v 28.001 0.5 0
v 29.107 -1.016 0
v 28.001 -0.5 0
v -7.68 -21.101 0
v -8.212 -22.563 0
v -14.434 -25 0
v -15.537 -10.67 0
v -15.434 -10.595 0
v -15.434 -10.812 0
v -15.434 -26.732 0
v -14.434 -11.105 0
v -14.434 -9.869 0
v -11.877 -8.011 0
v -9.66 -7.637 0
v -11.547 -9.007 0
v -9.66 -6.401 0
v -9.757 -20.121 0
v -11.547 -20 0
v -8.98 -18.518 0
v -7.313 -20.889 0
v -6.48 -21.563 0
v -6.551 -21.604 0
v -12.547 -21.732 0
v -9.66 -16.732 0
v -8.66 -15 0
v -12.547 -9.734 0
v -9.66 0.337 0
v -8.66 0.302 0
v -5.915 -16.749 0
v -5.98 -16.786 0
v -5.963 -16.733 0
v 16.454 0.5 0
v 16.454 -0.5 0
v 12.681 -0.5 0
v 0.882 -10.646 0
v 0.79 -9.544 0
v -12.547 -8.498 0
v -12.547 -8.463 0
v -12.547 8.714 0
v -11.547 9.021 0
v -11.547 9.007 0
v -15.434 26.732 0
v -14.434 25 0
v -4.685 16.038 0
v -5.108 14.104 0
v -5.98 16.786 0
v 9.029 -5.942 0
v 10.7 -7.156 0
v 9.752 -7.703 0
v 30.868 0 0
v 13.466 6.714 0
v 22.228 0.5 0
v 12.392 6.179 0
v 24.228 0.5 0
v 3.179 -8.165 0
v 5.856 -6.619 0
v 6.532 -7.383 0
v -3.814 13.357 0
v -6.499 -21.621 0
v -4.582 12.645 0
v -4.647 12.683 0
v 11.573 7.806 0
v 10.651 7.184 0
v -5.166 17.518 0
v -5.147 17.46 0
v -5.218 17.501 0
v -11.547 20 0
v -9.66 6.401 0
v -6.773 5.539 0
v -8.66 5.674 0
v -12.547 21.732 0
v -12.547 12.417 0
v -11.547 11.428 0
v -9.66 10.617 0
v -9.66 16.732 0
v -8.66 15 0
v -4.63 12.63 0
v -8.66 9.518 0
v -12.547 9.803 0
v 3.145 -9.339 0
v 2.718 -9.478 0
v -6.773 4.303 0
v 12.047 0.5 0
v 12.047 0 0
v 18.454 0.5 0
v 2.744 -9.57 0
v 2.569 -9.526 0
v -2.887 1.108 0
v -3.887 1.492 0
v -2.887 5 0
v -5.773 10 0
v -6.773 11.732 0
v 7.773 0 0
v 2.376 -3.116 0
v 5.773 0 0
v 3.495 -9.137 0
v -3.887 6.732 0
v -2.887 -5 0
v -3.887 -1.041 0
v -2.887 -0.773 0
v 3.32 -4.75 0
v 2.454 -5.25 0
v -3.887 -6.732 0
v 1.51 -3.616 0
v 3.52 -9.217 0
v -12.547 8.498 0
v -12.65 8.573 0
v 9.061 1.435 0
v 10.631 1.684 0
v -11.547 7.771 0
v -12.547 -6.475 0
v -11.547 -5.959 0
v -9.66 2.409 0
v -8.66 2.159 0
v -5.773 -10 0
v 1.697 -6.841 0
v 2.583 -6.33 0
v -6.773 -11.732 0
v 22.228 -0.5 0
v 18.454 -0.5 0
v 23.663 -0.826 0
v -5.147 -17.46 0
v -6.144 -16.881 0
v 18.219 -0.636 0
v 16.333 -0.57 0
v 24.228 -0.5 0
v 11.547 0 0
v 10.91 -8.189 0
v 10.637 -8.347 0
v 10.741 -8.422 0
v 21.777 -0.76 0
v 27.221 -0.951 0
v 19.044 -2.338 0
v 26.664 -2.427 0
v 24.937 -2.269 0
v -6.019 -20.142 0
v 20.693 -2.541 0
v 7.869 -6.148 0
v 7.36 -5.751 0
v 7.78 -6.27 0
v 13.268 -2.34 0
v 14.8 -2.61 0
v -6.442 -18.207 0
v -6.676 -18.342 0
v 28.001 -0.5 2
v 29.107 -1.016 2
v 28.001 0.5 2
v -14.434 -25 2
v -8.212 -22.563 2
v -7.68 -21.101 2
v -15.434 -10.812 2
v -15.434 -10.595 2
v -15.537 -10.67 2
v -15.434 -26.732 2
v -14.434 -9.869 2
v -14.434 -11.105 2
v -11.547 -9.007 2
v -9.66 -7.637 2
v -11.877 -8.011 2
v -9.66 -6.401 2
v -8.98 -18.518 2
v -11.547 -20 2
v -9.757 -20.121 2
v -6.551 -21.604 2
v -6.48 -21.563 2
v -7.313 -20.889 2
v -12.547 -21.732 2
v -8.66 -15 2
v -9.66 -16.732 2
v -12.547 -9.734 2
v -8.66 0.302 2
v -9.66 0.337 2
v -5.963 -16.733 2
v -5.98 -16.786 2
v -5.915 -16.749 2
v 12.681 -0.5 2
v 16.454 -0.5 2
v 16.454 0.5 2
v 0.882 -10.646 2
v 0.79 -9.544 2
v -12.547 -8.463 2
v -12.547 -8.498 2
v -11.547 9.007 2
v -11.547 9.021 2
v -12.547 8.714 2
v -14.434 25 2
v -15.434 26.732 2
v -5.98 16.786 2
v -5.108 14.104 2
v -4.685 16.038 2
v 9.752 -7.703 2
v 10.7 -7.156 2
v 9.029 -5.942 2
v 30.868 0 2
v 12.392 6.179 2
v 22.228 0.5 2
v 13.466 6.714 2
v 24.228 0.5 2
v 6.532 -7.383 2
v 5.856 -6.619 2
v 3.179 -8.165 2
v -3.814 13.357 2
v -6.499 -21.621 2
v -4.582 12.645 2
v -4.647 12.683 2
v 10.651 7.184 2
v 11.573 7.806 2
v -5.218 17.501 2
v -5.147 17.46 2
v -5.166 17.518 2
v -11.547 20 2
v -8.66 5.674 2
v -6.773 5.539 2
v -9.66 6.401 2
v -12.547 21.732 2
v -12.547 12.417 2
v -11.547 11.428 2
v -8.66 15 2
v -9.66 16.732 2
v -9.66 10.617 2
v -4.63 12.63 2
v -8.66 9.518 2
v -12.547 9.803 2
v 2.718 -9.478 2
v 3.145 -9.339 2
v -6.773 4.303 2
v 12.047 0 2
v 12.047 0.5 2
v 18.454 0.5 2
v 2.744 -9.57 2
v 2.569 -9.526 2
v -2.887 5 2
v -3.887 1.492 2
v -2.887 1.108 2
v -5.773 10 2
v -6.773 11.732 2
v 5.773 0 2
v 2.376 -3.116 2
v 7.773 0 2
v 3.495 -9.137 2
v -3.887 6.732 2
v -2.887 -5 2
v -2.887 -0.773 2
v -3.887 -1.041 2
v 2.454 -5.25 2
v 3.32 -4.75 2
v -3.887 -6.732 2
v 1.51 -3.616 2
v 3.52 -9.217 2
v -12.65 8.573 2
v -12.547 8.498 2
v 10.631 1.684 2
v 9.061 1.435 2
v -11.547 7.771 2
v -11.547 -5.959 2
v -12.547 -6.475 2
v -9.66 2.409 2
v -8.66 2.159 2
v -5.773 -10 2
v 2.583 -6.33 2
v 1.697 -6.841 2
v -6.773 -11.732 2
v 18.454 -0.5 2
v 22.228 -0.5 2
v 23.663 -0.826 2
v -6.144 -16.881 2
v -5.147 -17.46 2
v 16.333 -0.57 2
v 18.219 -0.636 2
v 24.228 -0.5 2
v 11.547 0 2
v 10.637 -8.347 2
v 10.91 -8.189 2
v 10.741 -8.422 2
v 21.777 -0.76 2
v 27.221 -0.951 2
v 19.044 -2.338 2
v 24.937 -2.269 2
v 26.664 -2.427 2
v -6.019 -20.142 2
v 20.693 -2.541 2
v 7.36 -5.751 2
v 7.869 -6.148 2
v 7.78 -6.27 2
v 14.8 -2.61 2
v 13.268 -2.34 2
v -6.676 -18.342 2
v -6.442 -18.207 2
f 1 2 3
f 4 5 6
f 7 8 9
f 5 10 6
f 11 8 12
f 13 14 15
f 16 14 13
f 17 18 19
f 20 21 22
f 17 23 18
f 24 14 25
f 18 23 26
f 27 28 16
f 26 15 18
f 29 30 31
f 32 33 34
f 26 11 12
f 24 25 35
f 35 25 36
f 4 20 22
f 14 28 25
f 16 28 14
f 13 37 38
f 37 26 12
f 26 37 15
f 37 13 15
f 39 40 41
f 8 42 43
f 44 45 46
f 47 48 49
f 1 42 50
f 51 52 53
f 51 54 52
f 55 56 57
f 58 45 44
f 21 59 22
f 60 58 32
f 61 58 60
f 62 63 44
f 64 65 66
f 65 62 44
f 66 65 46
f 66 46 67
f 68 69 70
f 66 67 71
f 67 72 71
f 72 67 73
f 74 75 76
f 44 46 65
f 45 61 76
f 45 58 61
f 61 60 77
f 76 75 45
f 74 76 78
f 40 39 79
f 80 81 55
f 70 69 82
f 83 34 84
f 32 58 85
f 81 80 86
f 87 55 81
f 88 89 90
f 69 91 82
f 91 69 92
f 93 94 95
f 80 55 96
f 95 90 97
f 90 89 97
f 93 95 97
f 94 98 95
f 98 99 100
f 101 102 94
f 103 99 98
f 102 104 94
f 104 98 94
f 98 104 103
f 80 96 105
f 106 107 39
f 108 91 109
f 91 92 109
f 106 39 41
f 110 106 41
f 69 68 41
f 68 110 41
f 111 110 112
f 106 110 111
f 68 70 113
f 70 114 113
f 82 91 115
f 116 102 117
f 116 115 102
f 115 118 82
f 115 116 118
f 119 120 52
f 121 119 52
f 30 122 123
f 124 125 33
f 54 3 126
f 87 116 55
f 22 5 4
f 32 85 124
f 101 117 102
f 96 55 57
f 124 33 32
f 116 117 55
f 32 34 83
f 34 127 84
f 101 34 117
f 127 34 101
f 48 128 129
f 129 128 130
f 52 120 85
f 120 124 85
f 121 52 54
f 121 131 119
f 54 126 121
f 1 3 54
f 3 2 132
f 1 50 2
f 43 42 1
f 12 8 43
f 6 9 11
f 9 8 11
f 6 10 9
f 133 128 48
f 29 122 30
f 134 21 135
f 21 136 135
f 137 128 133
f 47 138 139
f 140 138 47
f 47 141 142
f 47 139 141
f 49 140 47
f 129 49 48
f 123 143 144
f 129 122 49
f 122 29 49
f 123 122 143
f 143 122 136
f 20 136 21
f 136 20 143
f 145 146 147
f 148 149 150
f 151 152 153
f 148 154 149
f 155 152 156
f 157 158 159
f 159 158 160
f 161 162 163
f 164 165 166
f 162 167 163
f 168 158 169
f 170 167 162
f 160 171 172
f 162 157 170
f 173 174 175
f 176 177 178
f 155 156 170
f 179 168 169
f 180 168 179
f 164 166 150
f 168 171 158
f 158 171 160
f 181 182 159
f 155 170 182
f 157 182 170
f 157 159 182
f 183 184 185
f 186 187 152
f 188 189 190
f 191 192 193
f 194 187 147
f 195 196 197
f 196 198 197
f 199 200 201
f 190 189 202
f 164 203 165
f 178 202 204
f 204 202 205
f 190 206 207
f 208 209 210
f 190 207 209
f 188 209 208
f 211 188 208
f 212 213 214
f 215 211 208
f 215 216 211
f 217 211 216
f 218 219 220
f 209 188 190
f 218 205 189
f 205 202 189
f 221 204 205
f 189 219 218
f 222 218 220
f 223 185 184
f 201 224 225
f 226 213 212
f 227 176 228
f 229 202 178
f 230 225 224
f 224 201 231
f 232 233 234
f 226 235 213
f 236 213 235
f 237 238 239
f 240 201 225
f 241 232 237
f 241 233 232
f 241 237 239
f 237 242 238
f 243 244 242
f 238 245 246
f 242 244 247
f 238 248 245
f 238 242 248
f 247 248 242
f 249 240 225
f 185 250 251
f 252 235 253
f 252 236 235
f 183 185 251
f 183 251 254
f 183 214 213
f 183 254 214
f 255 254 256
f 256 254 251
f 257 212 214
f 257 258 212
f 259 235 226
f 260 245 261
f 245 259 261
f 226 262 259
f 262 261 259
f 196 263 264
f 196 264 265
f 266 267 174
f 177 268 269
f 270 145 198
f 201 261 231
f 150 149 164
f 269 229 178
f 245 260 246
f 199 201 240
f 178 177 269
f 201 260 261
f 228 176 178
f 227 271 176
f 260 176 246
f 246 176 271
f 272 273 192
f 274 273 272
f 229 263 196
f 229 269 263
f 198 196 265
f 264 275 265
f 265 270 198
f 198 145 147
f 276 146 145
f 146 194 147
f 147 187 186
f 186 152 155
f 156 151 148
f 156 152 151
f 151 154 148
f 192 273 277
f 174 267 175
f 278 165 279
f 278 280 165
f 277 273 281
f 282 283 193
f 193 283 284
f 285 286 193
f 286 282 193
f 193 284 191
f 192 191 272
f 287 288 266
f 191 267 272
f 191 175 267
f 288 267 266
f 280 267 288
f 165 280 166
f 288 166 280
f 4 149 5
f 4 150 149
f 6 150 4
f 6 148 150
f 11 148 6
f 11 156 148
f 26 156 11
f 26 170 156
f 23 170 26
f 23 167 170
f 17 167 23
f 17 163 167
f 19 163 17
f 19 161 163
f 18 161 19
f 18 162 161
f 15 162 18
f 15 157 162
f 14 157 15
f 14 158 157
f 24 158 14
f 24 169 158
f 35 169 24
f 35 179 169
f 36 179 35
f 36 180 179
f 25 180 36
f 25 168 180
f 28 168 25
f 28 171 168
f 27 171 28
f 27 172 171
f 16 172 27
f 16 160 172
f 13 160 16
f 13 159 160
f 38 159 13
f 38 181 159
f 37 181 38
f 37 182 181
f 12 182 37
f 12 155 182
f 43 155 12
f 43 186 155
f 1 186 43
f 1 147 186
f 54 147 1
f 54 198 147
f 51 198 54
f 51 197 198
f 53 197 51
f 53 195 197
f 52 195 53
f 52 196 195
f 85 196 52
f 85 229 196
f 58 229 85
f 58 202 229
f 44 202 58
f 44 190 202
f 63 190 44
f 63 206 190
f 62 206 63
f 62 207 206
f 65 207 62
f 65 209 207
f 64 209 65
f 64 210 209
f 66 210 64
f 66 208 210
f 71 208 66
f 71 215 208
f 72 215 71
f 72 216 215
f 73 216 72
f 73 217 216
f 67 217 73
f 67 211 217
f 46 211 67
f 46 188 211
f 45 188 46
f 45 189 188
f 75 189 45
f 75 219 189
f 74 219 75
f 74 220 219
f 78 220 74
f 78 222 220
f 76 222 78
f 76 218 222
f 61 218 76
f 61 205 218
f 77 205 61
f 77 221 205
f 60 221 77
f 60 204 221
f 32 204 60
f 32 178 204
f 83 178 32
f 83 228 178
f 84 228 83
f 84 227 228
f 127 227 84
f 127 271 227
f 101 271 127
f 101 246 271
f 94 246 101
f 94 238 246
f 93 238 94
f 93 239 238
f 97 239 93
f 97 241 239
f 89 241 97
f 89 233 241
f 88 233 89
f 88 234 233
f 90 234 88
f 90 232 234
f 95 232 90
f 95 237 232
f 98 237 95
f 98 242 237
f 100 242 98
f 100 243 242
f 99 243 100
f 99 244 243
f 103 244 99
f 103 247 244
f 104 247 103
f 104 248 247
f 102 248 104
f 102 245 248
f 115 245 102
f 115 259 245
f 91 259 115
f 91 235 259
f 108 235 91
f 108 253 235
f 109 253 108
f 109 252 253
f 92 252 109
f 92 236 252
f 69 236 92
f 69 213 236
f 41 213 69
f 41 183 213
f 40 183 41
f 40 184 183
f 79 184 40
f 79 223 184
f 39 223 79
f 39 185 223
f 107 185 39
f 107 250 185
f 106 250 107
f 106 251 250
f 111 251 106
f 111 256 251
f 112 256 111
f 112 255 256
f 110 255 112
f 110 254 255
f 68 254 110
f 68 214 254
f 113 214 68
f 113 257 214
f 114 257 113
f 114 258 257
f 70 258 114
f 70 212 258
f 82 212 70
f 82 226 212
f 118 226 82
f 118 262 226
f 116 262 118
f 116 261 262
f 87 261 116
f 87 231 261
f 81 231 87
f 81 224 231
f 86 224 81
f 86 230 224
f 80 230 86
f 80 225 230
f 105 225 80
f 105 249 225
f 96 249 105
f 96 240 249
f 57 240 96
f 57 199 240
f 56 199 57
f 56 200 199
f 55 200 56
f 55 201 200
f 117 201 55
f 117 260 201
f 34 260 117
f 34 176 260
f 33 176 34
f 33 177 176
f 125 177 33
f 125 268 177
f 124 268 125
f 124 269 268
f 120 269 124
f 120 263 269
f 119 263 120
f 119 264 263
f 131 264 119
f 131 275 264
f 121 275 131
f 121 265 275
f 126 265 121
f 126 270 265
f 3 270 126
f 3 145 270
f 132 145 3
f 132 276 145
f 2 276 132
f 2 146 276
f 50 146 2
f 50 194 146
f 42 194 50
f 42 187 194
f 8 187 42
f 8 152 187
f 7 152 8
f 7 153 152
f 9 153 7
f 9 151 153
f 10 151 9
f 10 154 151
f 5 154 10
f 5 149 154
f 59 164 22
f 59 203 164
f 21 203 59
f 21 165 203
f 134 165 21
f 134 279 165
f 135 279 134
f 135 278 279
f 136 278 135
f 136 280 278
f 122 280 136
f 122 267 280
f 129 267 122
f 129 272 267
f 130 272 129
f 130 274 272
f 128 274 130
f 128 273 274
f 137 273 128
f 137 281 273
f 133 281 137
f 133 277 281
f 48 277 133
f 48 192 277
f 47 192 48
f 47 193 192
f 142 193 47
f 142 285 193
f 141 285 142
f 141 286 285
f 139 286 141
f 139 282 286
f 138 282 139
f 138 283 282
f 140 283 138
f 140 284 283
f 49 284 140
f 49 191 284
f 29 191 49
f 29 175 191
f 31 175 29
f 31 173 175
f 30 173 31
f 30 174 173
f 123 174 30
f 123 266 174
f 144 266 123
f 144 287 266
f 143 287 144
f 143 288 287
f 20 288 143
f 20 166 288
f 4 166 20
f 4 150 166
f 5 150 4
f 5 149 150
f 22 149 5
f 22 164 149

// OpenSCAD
side_length = 50; 

wall_thickness = 1;
wall_height = 2;

cblocks = 10;  
levels = 5; 

/*
 * constants, for clearness
 *
 */
 
// random directions, for picking up a direction to visit the next block
function PERMUTATION_OF_FOUR() = [
    [1, 2, 3, 4],
    [1, 2, 4, 3],
    [1, 3, 2, 4],
    [1, 3, 4, 2],
    [1, 4, 2, 3],
    [1, 4, 3, 2],
    [2, 1, 3, 4],
    [2, 1, 4, 3],
    [2, 3, 1, 4],
    [2, 3, 4, 1],
    [2, 4, 1, 3],
    [2, 4, 3, 1],
    [3, 1, 2, 4],
    [3, 1, 4, 2],
    [3, 2, 1, 4],
    [3, 2, 4, 1],
    [3, 4, 1, 2],
    [3, 4, 2, 1],
    [4, 1, 2, 3],
    [4, 1, 3, 2],
    [4, 2, 1, 3],
    [4, 2, 3, 1],
    [4, 3, 1, 2],
    [4, 3, 2, 1]
];

function NO_WALL() = 0;
function UP_WALL() = 1;
function RIGHT_WALL() = 2;
function UP_RIGHT_WALL() = 3;

function NOT_VISITED() = 0;
function VISITED() = 1;

/* 
 * modules for creating a maze
 *
 */

function PI() = 3.14159;



/* 
 * utilities functions
 *
 */

// comare the equality of [x1, y1] and [x2, y2]
function cord_equals(cord1, cord2) = cord1 == cord2;

// is the point visited?
function not_visited(cord, vs, index = 0) =
    index == len(vs) ? true : 
        (cord_equals([vs[index][0], vs[index][1]], cord) && vs[index][2] == 1 ? false :
            not_visited(cord, vs, index + 1));
            
// pick a direction randomly
function rand_dirs() =
    PERMUTATION_OF_FOUR()[round(rands(0, 24, 1)[0])]; 

// replace v1 in the vector with v2 
function replace(v1, v2, vs) =
    [for(i = [0:len(vs) - 1]) vs[i] == v1 ? v2 : vs[i]];
    
/* 
 * functions for generating a maze vector
 *
 */

// initialize a maze
function init_maze(rows, columns) = 
    [
	    for(c = [1 : columns]) 
	        for(r = [1 : rows]) 
		        [c, r, 0,  UP_RIGHT_WALL()]
	];
    
// find a vector in the maze vector
function find(i, j, maze_vector, index = 0) =
    index == len(maze_vector) ? [] : (
        cord_equals([i, j], [maze_vector[index][0], maze_vector[index][1]]) ? maze_vector[index] : find(i, j, maze_vector, index + 1)
    );

////
// NO_WALL = 0;
// UP_WALL = 1;
// RIGHT_WALL = 2;
// UP_RIGHT_WALL = 3;
function delete_right_wall(original_block) = 
    original_block == NO_WALL() || original_block == RIGHT_WALL() ? NO_WALL() : UP_WALL();

function delete_up_wall(original_block) = 
    (original_block == NO_WALL() || original_block == UP_WALL()) ? NO_WALL() : RIGHT_WALL();
    
function delete_right_wall_of(vs, is_visited, maze_vector) =
    replace(vs, [vs[0], vs[1] , is_visited, delete_right_wall(vs[3])] ,maze_vector);

function delete_up_wall_of(vs, is_visited, maze_vector) =
    replace(vs, [vs[0], vs[1] , is_visited, delete_up_wall(vs[3])] ,maze_vector);

function go_right(i, j, rows, columns, maze_vector) =
    go_maze(i + 1, j, rows, columns, delete_right_wall_of(find(i, j, maze_vector), VISITED(), maze_vector));
    
function go_up(i, j, rows, columns, maze_vector) =
    go_maze(i, j - 1, rows, columns, delete_up_wall_of(find(i, j, maze_vector), VISITED(), maze_vector));
    
function visit(v, maze_vector) =
    replace(v, [v[0], v[1], VISITED(), v[3]], maze_vector);
 
function go_left(i, j, rows, columns, maze_vector) =
    go_maze(i - 1, j, rows, columns, delete_right_wall_of(find(i - 1, j, maze_vector), NOT_VISITED(), maze_vector));
    
function go_down(i, j, rows, columns, maze_vector) =
    go_maze(i, j + 1, rows, columns, delete_up_wall_of(find(i, j + 1, maze_vector), NOT_VISITED(), maze_vector));
    
function go_maze(i, j, rows, columns, maze_vector) =
    look_around(i, j, rand_dirs(), rows, columns, visit(find(i, j, maze_vector), maze_vector));
    
function look_around(i, j, dirs, rows, columns, maze_vector, index = 0) =
    index == 4 ? maze_vector : 
        look_around( 
            i, j, dirs, 
            rows, columns, 
            build_wall(i, j, dirs[index], rows, columns, maze_vector), 
            index + 1
        ); 

function build_wall(i, j, n, rows, columns, maze_vector) = 
    n == 1 && i != columns && not_visited([i + 1, j], maze_vector) ? go_right(i, j, rows, columns, maze_vector) : ( 
        n == 2 && j != 1 && not_visited([i, j - 1], maze_vector) ? go_up(i, j, rows, columns, maze_vector)  : (
            n == 3 && i != 1 && not_visited([i - 1, j], maze_vector) ? go_left(i, j,rows, columns,  maze_vector)  : (
                n == 4 && j != rows && not_visited([i, j + 1], maze_vector) ? go_down(i, j, rows, columns, maze_vector) : maze_vector
            ) 
        )
    ); 

// give a [x, y] point and length. draw a line in the x direction
module x_line(point, length, thickness = 1) {
    offset = thickness / 2;
    translate([point[0] - offset, point[1] - offset, 0]) 
        square([length + thickness, thickness]);
}

// create a equilateral triangle
module equilateral_triangle(side_length, center = false) {
    radius = 0.57735026918962576450914878050196 * side_length;
	circle(r = radius, center = center, $fn = 3); 
}

// create a holly equilateral triangle
module holly_equilateral_triangle(side_length, thickness = 1, center = true) {
    difference() {
	    offset(delta = thickness) equilateral_triangle(side_length, center = center);
	    equilateral_triangle(side_length, center = center);
    }
}

// Given a side length of a equilateral triangle, return the length of incenter to vertex.
function triangle_incenter_to_vertex_length(triangle_side_length) = 0.57735026918962576450914878050196 * triangle_side_length;

// used by `sector_cutter` module. Accepted angle is from 0 to 90 degree.
module a_quarter_sector_cutter(radius, angle) {
    outer = radius;
    polygon([[0, 0], [outer, 0], [outer, outer * sin(angle)], [outer * cos(angle), outer * sin(angle)]]);
}

// userd by `holly_equilateral_triangle_sector` for difference
module sector_cutter(radius, angles) {
    angle_from = angles[0];
    angle_to = angles[1];
    angle_difference = angle_to - angle_from;
    
    rotate(angle_from)
        if(angle_difference <= 90) {
            a_quarter_sector_cutter(radius, angle_difference);
        } else if(angle_difference > 90 && angle_difference <= 180) {
            sector_cutter(radius, [0, 90]);
            rotate(90) a_quarter_sector_cutter(radius, angle_difference - 90);
        } else if(angle_difference > 180 && angle_difference <= 270) {
            sector_cutter(radius, [0, 180]);
            rotate(180) a_quarter_sector_cutter(radius, angle_difference - 180);
        } else if(angle_difference > 270 && angle_difference <= 360) {
            sector_cutter(radius, [0, 270]);
            rotate(270) a_quarter_sector_cutter(radius, angle_difference - 270);
       }
}

// For a triangle, a different angle has a different length from incenter to its side.
function triangle_incenter_to_side_length(incenter_to_vertex_length, angle) = 
    (angle >= 0 && angle <= 60) ? 0.5 * incenter_to_vertex_length / cos(angle) : (
	    (angle > 60 && angle <= 120) ? triangle_incenter_to_side_length(incenter_to_vertex_length, 120 - angle) : triangle_incenter_to_side_length(incenter_to_vertex_length, angle - 120)
	);

// draw a line from incenter to side for a equilateral triangle
module triangle_incenter_to_side_line(side_length, angle, incenter_to_side_blocks, level, thickness = 1) {
    block_length = triangle_incenter_to_side_length(triangle_incenter_to_vertex_length(side_length), angle + 60) / incenter_to_side_blocks ;
	
	rotate([0, 0, angle]) 
	    translate([block_length * (level - 1) + thickness, 0, 0])
		    x_line([0, 0], block_length - thickness / 2, thickness);
}

// draw a side between `angles[0]` and `angles[1]`
module holly_equilateral_triangle_sector(side_length, angles, thickness = 1) {
	intersection() {
        holly_equilateral_triangle(side_length, thickness);
	    sector_cutter(triangle_incenter_to_vertex_length(side_length) + thickness * 2, [angles[0], angles[1]]);
	}
}


module triangle_maze(side_length, cblocks, levels, thickness = 1) {
    full_circle_angle = 360;
    arc_angle = full_circle_angle / cblocks;
	incenter_to_side_blocks = levels - 2;
	
	divided_side_length = side_length / levels;
	
	maze = go_maze(1, 1, cblocks, incenter_to_side_blocks, replace([incenter_to_side_blocks, cblocks, 0, UP_RIGHT_WALL()], [incenter_to_side_blocks, cblocks, 0, UP_WALL()], init_maze(cblocks, incenter_to_side_blocks)));
	  
	// maze
    for(i = [0:len(maze) - 1]) { 
        cord = maze[i];
		cr = cord[0]; 
		cc = cord[1] - 1;    
        v = cord[3];
        
		angle = cc * arc_angle;
		
        if(v == 1 || v == 3) {
			triangle_incenter_to_side_line(side_length, angle, levels, cr + 2, thickness);
        } 
		
        if(v == 2 || v == 3) {
		    sl = divided_side_length * (cr + 2);
			offset_angle = angle - arc_angle / 18;
			
			holly_equilateral_triangle_sector(sl, [offset_angle,  offset_angle + arc_angle], thickness);   
        } 
		
		if(v == 0 || v == 1) {
		    sl = divided_side_length * (cr + 2);		
			factor = abs((arc_angle * (cc + 1)) % 120 - 60) / 60; 
			offset_angle = angle - arc_angle / 18;
			
			holly_equilateral_triangle_sector(sl, [offset_angle, offset_angle + arc_angle * (sl - divided_side_length + factor) / (sl - factor * (cr + 2))], thickness);    
		}		
	}
	
	// inner triangle
	rotate([0, 0, 240]) 
		holly_equilateral_triangle_sector(divided_side_length, [-45, 315 - arc_angle], thickness);
	
	triangle_incenter_to_side_line(side_length, 300, levels, 2, thickness = 1);

	holly_equilateral_triangle_sector(divided_side_length * 2, [arc_angle / 4, 360], thickness);
}

linear_extrude(wall_height) 
    triangle_maze(side_length, cblocks, levels, wall_thickness);




